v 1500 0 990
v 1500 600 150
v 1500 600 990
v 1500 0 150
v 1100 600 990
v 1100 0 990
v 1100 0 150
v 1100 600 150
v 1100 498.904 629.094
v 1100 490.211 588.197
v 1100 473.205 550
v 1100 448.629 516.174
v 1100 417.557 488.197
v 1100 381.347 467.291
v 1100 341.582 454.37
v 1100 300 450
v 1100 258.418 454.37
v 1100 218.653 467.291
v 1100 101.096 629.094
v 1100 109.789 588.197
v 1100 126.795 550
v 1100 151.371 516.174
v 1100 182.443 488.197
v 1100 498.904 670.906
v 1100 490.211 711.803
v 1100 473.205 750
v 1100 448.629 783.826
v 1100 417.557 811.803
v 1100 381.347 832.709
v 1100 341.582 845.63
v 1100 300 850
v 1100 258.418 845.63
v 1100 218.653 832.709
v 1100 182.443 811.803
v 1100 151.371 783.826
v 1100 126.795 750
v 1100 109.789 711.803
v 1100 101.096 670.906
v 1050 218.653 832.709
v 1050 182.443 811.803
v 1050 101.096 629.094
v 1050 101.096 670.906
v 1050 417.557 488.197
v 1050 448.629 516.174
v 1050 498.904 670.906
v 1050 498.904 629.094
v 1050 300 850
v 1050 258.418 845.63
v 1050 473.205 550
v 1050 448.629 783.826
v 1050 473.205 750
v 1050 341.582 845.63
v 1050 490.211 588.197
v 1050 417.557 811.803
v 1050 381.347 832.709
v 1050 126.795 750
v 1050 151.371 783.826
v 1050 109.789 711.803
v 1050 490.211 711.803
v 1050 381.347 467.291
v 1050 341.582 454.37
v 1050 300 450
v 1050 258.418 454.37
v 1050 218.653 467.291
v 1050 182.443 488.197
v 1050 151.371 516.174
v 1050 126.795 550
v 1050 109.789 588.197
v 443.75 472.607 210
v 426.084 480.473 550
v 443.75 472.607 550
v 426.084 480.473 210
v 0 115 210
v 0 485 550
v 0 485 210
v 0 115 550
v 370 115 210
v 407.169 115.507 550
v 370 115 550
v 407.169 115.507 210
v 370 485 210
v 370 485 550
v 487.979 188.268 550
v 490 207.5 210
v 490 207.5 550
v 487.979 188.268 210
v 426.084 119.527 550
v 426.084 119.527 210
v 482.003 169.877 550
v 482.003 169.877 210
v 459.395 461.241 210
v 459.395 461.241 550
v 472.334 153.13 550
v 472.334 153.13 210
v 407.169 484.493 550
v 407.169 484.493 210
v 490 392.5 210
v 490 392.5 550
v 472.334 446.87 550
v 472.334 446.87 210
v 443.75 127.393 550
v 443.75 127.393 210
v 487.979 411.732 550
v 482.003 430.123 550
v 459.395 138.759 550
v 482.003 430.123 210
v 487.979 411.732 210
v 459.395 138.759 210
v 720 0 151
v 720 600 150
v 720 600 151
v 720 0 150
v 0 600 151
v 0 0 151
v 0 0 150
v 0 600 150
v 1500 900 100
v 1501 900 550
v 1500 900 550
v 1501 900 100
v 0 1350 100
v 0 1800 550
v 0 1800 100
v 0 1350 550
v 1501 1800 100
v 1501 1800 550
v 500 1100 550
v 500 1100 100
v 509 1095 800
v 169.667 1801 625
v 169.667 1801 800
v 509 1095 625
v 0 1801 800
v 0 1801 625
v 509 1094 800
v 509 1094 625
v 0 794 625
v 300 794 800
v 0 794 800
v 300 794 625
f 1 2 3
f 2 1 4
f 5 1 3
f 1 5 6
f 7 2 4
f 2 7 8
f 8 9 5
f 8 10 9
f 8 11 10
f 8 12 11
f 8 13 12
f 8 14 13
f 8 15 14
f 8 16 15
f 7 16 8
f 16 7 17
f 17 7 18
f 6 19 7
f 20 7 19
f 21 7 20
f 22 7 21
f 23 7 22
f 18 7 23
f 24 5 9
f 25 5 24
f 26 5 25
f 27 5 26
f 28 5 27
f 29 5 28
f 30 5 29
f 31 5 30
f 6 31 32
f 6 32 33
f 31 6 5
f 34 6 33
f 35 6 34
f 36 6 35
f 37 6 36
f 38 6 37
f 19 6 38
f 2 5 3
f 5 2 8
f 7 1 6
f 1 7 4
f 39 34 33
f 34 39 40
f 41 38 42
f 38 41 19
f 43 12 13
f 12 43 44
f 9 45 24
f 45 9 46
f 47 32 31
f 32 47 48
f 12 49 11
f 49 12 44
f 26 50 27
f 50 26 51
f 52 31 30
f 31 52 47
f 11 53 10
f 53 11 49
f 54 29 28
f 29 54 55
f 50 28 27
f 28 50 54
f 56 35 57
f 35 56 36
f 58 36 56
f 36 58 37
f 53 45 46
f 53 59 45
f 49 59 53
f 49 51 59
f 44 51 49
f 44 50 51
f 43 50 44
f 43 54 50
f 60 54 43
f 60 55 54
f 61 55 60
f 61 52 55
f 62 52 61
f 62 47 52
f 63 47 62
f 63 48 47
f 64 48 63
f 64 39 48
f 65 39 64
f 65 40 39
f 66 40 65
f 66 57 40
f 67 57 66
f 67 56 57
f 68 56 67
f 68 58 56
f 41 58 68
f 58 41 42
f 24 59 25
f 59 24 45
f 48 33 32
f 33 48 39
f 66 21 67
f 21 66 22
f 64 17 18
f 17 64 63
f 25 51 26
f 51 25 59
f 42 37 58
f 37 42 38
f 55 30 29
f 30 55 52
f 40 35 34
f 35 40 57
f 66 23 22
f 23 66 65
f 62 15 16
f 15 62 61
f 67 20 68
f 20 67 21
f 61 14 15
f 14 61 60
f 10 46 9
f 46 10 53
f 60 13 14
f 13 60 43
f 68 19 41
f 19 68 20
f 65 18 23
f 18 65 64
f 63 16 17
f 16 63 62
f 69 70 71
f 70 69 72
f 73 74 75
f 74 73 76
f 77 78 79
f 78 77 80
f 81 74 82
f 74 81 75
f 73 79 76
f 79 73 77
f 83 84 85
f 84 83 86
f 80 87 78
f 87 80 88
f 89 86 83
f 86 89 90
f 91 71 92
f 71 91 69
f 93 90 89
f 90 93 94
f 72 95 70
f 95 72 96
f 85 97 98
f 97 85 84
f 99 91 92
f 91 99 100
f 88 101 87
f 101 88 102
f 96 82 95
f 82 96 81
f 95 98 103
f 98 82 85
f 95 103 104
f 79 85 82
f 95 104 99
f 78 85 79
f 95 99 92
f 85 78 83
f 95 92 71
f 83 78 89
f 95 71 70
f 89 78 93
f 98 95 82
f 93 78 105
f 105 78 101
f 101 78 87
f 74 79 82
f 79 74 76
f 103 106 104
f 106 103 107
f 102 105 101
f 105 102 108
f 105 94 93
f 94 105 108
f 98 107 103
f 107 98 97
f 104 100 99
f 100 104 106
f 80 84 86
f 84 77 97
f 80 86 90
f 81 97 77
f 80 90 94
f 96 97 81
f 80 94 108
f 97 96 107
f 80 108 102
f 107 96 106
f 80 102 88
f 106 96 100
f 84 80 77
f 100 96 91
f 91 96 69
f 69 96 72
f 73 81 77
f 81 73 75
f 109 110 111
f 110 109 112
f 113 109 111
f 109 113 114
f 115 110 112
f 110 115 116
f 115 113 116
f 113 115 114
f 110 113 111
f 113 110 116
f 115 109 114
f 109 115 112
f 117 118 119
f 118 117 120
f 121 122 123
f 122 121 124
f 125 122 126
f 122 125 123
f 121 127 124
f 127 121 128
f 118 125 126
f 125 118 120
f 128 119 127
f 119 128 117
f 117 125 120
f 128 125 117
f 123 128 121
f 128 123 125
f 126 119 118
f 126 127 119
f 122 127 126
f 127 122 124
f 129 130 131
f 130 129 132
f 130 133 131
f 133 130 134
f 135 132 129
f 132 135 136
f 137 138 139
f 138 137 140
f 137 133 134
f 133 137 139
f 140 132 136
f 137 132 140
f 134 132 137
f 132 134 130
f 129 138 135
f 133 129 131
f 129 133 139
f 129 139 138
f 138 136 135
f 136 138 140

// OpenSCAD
L=1800;
W=1500;
H=2450;

%cube([W,L,1]);
%cube([1,L,H]);
%translate([0,L,0])cube([W,1,H]);


level=150;

translate([W-400,0,level]) washer();

translate([0,L-900,100]) tube();
translate([0,L-1006,800-175]) sink();

translate([0,300-370/2, level]) wc();
//translate([370/1.4,370*(0), level]) rotate([0,0,45]) wc();
//%translate([0,0,level-25]) cube([370+350,1000,25]);

module washer(){
    cube([400,600,840]);
    translate([0,300,500]) rotate([0,-90,0]) cylinder(h=50,r=200);
}


// https://i.sdvk.ru/i/Art-Max/RIMINI-AM204CHR-CHasha-unitaza-podvesnogo-bezobodkovogo-234851/356502.jpg
module wc(){
    
    translate([0,0,60])hull(){
        cube([370,370,340]);
        for(i=[-1,1]) translate([490-370/4,i*(370/4)+370/2]) 
            cylinder(h=340,r=370/4);
    }
    
    translate([0,-300+370/2,0]) cube([370+350,600,1]);
}

module tube(){
    w=[450,700,900];
    x=[0,500,1500];
    hull(){
        for(i=[0:2]) translate([x[i],900-w[i],0]) cube([1,w[i],450]);
    }
}

module sink(){
    w=[300,509,509/3];
    x=[0,300,1006];
    color([1,1,1,0.4])
    hull(){
        for(i=[0:2]) translate([0,x[i],0]) cube([w[i],1,175]);
    }
}
